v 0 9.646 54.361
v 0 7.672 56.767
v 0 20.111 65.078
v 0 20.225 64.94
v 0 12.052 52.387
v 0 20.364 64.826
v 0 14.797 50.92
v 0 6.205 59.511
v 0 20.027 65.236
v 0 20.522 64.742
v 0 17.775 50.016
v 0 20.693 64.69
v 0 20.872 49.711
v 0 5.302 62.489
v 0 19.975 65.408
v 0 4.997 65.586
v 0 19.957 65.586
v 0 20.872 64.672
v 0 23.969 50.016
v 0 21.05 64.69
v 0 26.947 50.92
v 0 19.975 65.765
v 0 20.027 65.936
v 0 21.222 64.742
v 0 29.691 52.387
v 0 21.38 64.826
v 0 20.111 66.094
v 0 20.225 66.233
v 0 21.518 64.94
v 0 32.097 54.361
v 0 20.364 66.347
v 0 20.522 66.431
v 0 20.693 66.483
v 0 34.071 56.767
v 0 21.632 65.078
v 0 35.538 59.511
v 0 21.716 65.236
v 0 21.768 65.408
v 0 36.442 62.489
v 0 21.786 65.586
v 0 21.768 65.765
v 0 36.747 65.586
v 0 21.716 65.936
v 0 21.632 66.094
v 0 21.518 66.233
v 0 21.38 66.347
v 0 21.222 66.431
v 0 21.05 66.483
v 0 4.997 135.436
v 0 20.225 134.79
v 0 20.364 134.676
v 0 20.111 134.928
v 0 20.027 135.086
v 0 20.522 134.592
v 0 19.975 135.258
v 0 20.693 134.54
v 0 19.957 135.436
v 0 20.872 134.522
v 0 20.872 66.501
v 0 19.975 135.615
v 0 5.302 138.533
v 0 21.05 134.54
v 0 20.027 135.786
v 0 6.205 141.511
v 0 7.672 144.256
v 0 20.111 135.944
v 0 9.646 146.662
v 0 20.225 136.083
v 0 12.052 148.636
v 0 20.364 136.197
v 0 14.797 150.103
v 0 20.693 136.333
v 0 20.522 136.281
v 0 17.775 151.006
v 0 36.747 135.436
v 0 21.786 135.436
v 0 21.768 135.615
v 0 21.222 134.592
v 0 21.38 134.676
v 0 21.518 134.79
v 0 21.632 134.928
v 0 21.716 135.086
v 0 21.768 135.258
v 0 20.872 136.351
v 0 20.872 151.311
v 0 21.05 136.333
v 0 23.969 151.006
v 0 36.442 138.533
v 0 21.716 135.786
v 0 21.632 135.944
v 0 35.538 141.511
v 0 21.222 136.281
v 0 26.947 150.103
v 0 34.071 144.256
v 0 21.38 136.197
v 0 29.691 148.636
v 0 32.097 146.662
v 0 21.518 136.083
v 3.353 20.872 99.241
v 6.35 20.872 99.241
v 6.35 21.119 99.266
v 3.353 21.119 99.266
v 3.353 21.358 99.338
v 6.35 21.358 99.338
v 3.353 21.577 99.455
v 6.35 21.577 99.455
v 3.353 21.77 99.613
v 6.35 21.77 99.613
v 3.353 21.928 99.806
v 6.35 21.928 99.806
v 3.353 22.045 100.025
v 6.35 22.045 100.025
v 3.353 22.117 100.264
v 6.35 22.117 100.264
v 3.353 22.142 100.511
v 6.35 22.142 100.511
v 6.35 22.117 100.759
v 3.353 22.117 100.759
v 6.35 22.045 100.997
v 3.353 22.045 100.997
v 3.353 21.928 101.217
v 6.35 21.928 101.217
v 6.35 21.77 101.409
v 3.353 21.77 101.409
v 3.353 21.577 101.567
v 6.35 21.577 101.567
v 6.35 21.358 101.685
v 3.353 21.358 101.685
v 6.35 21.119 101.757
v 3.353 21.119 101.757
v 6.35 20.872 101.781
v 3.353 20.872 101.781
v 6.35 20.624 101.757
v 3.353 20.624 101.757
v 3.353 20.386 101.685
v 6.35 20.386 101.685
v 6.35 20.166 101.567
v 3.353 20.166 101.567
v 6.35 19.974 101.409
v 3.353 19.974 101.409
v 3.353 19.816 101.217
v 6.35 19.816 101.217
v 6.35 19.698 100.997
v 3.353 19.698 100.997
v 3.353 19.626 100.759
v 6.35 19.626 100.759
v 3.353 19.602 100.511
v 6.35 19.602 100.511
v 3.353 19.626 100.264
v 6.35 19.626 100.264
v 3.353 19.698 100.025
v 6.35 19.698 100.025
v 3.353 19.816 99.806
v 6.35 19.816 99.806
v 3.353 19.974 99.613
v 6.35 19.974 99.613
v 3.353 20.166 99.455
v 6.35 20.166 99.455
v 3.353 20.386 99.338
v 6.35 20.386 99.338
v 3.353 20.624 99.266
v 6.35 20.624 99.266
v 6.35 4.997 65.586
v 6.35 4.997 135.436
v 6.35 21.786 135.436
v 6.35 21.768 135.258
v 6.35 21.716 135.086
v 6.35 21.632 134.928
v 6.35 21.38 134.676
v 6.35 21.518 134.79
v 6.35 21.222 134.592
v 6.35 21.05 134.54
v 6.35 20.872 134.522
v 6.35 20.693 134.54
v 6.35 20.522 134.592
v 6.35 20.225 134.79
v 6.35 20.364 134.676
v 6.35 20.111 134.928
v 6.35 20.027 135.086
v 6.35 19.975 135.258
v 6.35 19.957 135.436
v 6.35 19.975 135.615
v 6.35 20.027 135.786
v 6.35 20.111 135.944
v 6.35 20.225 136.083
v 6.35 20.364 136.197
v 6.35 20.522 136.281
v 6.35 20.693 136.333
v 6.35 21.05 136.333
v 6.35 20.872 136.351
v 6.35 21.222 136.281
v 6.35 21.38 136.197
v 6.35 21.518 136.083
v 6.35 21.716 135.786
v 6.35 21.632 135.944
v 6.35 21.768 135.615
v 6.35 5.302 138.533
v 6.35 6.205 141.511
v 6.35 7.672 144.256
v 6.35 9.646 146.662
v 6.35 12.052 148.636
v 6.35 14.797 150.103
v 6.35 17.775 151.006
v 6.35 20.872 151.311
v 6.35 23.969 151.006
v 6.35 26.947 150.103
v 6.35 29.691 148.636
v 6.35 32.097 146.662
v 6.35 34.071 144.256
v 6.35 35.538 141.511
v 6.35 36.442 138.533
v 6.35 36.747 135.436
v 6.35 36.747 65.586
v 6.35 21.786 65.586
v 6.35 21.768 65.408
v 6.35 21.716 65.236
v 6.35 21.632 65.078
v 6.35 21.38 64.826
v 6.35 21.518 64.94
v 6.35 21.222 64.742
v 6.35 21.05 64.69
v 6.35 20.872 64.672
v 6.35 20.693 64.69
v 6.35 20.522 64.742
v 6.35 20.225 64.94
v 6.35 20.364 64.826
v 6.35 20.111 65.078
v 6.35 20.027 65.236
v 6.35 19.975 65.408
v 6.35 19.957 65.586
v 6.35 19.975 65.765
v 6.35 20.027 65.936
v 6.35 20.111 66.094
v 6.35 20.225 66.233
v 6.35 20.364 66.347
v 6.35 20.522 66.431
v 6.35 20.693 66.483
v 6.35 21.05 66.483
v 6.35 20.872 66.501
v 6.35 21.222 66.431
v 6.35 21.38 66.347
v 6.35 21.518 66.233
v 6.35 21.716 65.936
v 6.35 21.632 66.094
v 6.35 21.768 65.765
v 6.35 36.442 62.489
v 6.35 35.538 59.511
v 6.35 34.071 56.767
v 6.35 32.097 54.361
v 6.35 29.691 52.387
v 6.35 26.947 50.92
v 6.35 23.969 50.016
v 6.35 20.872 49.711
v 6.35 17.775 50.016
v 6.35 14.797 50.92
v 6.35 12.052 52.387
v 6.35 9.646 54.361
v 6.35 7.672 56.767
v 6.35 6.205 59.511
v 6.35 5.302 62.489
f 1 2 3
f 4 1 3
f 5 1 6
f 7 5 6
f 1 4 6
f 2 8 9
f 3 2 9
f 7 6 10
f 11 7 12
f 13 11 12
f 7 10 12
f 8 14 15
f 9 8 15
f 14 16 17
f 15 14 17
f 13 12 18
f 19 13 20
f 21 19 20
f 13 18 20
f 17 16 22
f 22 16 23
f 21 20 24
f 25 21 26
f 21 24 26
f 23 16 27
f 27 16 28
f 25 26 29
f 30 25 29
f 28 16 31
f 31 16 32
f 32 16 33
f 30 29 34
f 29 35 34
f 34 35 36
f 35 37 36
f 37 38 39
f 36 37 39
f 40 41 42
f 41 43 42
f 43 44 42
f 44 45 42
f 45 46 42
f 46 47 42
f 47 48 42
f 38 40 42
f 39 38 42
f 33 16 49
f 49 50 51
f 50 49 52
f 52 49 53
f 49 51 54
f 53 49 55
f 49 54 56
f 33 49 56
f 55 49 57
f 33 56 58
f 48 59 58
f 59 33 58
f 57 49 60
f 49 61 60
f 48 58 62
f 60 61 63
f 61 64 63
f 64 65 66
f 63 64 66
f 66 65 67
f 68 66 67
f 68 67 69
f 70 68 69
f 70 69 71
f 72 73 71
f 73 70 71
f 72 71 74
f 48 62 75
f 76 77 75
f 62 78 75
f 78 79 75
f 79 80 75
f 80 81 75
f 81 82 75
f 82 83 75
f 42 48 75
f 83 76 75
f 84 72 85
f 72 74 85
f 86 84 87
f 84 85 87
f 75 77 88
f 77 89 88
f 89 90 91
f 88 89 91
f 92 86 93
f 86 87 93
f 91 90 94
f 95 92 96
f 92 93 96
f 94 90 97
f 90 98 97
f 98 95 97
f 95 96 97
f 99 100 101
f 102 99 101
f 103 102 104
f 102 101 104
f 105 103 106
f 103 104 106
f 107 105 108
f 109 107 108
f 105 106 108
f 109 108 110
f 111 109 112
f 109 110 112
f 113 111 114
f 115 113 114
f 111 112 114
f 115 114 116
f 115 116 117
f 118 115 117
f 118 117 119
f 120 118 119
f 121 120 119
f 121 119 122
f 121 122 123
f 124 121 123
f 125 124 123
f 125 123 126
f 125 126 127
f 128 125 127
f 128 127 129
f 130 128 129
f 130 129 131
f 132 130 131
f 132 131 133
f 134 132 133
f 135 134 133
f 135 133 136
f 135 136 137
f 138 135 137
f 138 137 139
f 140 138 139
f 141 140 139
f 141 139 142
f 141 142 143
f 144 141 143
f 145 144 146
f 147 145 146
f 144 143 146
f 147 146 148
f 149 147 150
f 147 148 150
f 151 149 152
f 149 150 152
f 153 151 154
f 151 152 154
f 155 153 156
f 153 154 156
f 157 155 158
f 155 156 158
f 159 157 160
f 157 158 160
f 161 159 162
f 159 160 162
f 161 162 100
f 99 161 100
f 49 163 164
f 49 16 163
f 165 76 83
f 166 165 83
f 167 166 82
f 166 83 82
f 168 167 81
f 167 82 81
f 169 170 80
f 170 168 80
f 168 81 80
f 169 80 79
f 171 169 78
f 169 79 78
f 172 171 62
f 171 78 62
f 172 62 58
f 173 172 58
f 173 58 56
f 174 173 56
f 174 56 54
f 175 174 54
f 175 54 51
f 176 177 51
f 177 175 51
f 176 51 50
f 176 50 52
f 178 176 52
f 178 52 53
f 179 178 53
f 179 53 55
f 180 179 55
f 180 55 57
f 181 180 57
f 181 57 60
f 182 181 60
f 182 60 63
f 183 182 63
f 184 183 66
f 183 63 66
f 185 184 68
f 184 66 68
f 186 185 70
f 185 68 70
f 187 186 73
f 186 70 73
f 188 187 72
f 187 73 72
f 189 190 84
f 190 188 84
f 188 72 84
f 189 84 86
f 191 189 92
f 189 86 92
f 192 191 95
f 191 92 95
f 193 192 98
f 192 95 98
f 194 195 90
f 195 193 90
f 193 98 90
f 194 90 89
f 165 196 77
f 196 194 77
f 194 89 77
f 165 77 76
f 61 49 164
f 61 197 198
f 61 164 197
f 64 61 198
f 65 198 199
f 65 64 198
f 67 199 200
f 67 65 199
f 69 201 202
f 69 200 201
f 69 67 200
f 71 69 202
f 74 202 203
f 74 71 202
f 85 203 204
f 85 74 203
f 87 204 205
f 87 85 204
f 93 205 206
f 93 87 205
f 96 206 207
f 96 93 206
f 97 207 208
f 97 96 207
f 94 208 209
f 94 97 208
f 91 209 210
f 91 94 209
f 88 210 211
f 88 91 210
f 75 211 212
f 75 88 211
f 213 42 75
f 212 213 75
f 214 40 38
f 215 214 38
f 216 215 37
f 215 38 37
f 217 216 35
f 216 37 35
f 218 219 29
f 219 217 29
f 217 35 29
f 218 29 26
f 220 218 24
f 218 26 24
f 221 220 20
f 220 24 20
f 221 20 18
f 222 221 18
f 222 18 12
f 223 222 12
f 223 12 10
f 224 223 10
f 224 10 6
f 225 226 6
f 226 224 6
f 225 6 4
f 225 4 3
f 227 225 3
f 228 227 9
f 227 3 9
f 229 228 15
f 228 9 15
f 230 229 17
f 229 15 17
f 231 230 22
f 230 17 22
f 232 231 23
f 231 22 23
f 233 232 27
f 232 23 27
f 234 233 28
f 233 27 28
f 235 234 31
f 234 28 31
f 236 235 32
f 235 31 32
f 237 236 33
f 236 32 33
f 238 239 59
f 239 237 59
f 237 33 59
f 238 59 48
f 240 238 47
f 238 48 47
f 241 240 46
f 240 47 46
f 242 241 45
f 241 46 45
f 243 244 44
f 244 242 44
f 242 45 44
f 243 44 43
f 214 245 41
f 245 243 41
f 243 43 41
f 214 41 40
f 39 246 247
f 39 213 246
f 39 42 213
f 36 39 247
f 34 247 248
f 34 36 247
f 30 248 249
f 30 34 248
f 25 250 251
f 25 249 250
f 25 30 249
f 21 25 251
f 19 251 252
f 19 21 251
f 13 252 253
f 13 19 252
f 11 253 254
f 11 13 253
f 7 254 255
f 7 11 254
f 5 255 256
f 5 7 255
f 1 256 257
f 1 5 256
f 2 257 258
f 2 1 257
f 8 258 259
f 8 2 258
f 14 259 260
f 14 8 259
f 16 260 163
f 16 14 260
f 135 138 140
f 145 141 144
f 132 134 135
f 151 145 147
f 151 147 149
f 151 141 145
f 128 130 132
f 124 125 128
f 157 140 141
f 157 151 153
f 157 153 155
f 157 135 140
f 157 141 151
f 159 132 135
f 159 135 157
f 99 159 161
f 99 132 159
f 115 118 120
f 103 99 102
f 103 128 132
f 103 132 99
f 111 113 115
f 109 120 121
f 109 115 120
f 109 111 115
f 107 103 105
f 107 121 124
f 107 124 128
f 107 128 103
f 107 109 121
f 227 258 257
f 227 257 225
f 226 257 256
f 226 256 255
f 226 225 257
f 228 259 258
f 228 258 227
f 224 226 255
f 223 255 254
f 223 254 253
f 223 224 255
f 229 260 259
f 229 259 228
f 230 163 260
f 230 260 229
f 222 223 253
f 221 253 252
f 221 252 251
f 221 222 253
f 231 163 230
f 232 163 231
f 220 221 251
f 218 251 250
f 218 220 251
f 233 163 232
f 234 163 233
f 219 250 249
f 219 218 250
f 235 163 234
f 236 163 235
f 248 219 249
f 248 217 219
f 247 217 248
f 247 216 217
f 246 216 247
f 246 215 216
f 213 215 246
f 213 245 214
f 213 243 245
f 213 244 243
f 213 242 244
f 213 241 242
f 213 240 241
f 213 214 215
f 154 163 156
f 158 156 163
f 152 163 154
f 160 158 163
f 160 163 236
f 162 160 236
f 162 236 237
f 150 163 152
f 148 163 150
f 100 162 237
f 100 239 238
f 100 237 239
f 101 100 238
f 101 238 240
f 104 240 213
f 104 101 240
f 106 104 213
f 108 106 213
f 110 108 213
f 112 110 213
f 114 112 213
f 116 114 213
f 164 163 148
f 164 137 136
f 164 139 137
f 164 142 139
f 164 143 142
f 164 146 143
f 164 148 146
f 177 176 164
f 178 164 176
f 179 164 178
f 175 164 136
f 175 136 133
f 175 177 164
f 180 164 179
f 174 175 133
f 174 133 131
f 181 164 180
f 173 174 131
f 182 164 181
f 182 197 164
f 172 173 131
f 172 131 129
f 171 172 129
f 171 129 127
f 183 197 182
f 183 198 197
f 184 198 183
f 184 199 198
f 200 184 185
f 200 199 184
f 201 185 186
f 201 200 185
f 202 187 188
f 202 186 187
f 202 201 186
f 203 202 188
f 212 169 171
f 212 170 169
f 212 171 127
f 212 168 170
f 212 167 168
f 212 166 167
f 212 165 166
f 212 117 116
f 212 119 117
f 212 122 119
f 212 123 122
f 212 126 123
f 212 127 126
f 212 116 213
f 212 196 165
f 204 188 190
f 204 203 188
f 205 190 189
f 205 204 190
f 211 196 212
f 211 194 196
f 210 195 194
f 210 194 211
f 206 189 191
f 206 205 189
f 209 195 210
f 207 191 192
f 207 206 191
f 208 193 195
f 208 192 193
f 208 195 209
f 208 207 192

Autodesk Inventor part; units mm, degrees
ref_plane "YZ Plane" through (0, 0, 0) normal (1, 0, 0) x (0, 1, 0)
ref_plane "XZ Plane" through (0, 0, 0) normal (0, 1, 0) x (-1, 0, 0)
ref_plane "XY Plane" through (0, 0, 0) normal (0, 0, 1) x (1, 0, 0)
sketch "Sketch1" plane through (0, 0, 0) normal (1, 0, 0) x (0, 1, 0)
  arc A0 (4.9966, 65.5864) -> (36.7466, 65.5864) centre (20.8716, 65.5864) ccw
  line L0 (36.7466, 65.5864) -> (36.7466, 100.5114)
  line L1 (4.9966, 65.5864) -> (4.9966, 100.5114)
  arc A1 (36.7466, 135.4364) -> (4.9966, 135.4364) centre (20.8716, 135.4364) ccw
  line L2 (36.7466, 135.4364) -> (36.7466, 100.5114)
  line L3 (4.9966, 135.4364) -> (4.9966, 100.5114)
  circle A2 centre (20.8716, 135.4364) radius 0.9144
  circle A3 centre (20.8716, 65.5864) radius 0.9144
  dimension "d3" = 1.8288
  dimension "d4" = 1.8288
extrude "Extrusion1" add sketch "Sketch1" along normal blind 6.35
sketch "Sketch2" plane through (6.35, 0, 0) normal (1, 0, 0) x (0, 0, -1)
  point P0 (0, 0)
sketch "Sketch5" plane through (6.35, 0, 0) normal (1, 0, 0) x (0, 0, -1)
  circle A0 centre (-135.4364, 20.8716) radius 0.9144 projected
  circle A1 centre (-65.5864, 20.8716) radius 0.9144 projected
  circle A2 centre (-100.5114, 20.8716) radius 1.27
  point P0 (0, 0)
  dimension "d18" = 2.54
extrude "Extrusion4" cut sketch "Sketch5" against normal blind 2.9972 contours A2
properties part number "Second Arm half scale"
